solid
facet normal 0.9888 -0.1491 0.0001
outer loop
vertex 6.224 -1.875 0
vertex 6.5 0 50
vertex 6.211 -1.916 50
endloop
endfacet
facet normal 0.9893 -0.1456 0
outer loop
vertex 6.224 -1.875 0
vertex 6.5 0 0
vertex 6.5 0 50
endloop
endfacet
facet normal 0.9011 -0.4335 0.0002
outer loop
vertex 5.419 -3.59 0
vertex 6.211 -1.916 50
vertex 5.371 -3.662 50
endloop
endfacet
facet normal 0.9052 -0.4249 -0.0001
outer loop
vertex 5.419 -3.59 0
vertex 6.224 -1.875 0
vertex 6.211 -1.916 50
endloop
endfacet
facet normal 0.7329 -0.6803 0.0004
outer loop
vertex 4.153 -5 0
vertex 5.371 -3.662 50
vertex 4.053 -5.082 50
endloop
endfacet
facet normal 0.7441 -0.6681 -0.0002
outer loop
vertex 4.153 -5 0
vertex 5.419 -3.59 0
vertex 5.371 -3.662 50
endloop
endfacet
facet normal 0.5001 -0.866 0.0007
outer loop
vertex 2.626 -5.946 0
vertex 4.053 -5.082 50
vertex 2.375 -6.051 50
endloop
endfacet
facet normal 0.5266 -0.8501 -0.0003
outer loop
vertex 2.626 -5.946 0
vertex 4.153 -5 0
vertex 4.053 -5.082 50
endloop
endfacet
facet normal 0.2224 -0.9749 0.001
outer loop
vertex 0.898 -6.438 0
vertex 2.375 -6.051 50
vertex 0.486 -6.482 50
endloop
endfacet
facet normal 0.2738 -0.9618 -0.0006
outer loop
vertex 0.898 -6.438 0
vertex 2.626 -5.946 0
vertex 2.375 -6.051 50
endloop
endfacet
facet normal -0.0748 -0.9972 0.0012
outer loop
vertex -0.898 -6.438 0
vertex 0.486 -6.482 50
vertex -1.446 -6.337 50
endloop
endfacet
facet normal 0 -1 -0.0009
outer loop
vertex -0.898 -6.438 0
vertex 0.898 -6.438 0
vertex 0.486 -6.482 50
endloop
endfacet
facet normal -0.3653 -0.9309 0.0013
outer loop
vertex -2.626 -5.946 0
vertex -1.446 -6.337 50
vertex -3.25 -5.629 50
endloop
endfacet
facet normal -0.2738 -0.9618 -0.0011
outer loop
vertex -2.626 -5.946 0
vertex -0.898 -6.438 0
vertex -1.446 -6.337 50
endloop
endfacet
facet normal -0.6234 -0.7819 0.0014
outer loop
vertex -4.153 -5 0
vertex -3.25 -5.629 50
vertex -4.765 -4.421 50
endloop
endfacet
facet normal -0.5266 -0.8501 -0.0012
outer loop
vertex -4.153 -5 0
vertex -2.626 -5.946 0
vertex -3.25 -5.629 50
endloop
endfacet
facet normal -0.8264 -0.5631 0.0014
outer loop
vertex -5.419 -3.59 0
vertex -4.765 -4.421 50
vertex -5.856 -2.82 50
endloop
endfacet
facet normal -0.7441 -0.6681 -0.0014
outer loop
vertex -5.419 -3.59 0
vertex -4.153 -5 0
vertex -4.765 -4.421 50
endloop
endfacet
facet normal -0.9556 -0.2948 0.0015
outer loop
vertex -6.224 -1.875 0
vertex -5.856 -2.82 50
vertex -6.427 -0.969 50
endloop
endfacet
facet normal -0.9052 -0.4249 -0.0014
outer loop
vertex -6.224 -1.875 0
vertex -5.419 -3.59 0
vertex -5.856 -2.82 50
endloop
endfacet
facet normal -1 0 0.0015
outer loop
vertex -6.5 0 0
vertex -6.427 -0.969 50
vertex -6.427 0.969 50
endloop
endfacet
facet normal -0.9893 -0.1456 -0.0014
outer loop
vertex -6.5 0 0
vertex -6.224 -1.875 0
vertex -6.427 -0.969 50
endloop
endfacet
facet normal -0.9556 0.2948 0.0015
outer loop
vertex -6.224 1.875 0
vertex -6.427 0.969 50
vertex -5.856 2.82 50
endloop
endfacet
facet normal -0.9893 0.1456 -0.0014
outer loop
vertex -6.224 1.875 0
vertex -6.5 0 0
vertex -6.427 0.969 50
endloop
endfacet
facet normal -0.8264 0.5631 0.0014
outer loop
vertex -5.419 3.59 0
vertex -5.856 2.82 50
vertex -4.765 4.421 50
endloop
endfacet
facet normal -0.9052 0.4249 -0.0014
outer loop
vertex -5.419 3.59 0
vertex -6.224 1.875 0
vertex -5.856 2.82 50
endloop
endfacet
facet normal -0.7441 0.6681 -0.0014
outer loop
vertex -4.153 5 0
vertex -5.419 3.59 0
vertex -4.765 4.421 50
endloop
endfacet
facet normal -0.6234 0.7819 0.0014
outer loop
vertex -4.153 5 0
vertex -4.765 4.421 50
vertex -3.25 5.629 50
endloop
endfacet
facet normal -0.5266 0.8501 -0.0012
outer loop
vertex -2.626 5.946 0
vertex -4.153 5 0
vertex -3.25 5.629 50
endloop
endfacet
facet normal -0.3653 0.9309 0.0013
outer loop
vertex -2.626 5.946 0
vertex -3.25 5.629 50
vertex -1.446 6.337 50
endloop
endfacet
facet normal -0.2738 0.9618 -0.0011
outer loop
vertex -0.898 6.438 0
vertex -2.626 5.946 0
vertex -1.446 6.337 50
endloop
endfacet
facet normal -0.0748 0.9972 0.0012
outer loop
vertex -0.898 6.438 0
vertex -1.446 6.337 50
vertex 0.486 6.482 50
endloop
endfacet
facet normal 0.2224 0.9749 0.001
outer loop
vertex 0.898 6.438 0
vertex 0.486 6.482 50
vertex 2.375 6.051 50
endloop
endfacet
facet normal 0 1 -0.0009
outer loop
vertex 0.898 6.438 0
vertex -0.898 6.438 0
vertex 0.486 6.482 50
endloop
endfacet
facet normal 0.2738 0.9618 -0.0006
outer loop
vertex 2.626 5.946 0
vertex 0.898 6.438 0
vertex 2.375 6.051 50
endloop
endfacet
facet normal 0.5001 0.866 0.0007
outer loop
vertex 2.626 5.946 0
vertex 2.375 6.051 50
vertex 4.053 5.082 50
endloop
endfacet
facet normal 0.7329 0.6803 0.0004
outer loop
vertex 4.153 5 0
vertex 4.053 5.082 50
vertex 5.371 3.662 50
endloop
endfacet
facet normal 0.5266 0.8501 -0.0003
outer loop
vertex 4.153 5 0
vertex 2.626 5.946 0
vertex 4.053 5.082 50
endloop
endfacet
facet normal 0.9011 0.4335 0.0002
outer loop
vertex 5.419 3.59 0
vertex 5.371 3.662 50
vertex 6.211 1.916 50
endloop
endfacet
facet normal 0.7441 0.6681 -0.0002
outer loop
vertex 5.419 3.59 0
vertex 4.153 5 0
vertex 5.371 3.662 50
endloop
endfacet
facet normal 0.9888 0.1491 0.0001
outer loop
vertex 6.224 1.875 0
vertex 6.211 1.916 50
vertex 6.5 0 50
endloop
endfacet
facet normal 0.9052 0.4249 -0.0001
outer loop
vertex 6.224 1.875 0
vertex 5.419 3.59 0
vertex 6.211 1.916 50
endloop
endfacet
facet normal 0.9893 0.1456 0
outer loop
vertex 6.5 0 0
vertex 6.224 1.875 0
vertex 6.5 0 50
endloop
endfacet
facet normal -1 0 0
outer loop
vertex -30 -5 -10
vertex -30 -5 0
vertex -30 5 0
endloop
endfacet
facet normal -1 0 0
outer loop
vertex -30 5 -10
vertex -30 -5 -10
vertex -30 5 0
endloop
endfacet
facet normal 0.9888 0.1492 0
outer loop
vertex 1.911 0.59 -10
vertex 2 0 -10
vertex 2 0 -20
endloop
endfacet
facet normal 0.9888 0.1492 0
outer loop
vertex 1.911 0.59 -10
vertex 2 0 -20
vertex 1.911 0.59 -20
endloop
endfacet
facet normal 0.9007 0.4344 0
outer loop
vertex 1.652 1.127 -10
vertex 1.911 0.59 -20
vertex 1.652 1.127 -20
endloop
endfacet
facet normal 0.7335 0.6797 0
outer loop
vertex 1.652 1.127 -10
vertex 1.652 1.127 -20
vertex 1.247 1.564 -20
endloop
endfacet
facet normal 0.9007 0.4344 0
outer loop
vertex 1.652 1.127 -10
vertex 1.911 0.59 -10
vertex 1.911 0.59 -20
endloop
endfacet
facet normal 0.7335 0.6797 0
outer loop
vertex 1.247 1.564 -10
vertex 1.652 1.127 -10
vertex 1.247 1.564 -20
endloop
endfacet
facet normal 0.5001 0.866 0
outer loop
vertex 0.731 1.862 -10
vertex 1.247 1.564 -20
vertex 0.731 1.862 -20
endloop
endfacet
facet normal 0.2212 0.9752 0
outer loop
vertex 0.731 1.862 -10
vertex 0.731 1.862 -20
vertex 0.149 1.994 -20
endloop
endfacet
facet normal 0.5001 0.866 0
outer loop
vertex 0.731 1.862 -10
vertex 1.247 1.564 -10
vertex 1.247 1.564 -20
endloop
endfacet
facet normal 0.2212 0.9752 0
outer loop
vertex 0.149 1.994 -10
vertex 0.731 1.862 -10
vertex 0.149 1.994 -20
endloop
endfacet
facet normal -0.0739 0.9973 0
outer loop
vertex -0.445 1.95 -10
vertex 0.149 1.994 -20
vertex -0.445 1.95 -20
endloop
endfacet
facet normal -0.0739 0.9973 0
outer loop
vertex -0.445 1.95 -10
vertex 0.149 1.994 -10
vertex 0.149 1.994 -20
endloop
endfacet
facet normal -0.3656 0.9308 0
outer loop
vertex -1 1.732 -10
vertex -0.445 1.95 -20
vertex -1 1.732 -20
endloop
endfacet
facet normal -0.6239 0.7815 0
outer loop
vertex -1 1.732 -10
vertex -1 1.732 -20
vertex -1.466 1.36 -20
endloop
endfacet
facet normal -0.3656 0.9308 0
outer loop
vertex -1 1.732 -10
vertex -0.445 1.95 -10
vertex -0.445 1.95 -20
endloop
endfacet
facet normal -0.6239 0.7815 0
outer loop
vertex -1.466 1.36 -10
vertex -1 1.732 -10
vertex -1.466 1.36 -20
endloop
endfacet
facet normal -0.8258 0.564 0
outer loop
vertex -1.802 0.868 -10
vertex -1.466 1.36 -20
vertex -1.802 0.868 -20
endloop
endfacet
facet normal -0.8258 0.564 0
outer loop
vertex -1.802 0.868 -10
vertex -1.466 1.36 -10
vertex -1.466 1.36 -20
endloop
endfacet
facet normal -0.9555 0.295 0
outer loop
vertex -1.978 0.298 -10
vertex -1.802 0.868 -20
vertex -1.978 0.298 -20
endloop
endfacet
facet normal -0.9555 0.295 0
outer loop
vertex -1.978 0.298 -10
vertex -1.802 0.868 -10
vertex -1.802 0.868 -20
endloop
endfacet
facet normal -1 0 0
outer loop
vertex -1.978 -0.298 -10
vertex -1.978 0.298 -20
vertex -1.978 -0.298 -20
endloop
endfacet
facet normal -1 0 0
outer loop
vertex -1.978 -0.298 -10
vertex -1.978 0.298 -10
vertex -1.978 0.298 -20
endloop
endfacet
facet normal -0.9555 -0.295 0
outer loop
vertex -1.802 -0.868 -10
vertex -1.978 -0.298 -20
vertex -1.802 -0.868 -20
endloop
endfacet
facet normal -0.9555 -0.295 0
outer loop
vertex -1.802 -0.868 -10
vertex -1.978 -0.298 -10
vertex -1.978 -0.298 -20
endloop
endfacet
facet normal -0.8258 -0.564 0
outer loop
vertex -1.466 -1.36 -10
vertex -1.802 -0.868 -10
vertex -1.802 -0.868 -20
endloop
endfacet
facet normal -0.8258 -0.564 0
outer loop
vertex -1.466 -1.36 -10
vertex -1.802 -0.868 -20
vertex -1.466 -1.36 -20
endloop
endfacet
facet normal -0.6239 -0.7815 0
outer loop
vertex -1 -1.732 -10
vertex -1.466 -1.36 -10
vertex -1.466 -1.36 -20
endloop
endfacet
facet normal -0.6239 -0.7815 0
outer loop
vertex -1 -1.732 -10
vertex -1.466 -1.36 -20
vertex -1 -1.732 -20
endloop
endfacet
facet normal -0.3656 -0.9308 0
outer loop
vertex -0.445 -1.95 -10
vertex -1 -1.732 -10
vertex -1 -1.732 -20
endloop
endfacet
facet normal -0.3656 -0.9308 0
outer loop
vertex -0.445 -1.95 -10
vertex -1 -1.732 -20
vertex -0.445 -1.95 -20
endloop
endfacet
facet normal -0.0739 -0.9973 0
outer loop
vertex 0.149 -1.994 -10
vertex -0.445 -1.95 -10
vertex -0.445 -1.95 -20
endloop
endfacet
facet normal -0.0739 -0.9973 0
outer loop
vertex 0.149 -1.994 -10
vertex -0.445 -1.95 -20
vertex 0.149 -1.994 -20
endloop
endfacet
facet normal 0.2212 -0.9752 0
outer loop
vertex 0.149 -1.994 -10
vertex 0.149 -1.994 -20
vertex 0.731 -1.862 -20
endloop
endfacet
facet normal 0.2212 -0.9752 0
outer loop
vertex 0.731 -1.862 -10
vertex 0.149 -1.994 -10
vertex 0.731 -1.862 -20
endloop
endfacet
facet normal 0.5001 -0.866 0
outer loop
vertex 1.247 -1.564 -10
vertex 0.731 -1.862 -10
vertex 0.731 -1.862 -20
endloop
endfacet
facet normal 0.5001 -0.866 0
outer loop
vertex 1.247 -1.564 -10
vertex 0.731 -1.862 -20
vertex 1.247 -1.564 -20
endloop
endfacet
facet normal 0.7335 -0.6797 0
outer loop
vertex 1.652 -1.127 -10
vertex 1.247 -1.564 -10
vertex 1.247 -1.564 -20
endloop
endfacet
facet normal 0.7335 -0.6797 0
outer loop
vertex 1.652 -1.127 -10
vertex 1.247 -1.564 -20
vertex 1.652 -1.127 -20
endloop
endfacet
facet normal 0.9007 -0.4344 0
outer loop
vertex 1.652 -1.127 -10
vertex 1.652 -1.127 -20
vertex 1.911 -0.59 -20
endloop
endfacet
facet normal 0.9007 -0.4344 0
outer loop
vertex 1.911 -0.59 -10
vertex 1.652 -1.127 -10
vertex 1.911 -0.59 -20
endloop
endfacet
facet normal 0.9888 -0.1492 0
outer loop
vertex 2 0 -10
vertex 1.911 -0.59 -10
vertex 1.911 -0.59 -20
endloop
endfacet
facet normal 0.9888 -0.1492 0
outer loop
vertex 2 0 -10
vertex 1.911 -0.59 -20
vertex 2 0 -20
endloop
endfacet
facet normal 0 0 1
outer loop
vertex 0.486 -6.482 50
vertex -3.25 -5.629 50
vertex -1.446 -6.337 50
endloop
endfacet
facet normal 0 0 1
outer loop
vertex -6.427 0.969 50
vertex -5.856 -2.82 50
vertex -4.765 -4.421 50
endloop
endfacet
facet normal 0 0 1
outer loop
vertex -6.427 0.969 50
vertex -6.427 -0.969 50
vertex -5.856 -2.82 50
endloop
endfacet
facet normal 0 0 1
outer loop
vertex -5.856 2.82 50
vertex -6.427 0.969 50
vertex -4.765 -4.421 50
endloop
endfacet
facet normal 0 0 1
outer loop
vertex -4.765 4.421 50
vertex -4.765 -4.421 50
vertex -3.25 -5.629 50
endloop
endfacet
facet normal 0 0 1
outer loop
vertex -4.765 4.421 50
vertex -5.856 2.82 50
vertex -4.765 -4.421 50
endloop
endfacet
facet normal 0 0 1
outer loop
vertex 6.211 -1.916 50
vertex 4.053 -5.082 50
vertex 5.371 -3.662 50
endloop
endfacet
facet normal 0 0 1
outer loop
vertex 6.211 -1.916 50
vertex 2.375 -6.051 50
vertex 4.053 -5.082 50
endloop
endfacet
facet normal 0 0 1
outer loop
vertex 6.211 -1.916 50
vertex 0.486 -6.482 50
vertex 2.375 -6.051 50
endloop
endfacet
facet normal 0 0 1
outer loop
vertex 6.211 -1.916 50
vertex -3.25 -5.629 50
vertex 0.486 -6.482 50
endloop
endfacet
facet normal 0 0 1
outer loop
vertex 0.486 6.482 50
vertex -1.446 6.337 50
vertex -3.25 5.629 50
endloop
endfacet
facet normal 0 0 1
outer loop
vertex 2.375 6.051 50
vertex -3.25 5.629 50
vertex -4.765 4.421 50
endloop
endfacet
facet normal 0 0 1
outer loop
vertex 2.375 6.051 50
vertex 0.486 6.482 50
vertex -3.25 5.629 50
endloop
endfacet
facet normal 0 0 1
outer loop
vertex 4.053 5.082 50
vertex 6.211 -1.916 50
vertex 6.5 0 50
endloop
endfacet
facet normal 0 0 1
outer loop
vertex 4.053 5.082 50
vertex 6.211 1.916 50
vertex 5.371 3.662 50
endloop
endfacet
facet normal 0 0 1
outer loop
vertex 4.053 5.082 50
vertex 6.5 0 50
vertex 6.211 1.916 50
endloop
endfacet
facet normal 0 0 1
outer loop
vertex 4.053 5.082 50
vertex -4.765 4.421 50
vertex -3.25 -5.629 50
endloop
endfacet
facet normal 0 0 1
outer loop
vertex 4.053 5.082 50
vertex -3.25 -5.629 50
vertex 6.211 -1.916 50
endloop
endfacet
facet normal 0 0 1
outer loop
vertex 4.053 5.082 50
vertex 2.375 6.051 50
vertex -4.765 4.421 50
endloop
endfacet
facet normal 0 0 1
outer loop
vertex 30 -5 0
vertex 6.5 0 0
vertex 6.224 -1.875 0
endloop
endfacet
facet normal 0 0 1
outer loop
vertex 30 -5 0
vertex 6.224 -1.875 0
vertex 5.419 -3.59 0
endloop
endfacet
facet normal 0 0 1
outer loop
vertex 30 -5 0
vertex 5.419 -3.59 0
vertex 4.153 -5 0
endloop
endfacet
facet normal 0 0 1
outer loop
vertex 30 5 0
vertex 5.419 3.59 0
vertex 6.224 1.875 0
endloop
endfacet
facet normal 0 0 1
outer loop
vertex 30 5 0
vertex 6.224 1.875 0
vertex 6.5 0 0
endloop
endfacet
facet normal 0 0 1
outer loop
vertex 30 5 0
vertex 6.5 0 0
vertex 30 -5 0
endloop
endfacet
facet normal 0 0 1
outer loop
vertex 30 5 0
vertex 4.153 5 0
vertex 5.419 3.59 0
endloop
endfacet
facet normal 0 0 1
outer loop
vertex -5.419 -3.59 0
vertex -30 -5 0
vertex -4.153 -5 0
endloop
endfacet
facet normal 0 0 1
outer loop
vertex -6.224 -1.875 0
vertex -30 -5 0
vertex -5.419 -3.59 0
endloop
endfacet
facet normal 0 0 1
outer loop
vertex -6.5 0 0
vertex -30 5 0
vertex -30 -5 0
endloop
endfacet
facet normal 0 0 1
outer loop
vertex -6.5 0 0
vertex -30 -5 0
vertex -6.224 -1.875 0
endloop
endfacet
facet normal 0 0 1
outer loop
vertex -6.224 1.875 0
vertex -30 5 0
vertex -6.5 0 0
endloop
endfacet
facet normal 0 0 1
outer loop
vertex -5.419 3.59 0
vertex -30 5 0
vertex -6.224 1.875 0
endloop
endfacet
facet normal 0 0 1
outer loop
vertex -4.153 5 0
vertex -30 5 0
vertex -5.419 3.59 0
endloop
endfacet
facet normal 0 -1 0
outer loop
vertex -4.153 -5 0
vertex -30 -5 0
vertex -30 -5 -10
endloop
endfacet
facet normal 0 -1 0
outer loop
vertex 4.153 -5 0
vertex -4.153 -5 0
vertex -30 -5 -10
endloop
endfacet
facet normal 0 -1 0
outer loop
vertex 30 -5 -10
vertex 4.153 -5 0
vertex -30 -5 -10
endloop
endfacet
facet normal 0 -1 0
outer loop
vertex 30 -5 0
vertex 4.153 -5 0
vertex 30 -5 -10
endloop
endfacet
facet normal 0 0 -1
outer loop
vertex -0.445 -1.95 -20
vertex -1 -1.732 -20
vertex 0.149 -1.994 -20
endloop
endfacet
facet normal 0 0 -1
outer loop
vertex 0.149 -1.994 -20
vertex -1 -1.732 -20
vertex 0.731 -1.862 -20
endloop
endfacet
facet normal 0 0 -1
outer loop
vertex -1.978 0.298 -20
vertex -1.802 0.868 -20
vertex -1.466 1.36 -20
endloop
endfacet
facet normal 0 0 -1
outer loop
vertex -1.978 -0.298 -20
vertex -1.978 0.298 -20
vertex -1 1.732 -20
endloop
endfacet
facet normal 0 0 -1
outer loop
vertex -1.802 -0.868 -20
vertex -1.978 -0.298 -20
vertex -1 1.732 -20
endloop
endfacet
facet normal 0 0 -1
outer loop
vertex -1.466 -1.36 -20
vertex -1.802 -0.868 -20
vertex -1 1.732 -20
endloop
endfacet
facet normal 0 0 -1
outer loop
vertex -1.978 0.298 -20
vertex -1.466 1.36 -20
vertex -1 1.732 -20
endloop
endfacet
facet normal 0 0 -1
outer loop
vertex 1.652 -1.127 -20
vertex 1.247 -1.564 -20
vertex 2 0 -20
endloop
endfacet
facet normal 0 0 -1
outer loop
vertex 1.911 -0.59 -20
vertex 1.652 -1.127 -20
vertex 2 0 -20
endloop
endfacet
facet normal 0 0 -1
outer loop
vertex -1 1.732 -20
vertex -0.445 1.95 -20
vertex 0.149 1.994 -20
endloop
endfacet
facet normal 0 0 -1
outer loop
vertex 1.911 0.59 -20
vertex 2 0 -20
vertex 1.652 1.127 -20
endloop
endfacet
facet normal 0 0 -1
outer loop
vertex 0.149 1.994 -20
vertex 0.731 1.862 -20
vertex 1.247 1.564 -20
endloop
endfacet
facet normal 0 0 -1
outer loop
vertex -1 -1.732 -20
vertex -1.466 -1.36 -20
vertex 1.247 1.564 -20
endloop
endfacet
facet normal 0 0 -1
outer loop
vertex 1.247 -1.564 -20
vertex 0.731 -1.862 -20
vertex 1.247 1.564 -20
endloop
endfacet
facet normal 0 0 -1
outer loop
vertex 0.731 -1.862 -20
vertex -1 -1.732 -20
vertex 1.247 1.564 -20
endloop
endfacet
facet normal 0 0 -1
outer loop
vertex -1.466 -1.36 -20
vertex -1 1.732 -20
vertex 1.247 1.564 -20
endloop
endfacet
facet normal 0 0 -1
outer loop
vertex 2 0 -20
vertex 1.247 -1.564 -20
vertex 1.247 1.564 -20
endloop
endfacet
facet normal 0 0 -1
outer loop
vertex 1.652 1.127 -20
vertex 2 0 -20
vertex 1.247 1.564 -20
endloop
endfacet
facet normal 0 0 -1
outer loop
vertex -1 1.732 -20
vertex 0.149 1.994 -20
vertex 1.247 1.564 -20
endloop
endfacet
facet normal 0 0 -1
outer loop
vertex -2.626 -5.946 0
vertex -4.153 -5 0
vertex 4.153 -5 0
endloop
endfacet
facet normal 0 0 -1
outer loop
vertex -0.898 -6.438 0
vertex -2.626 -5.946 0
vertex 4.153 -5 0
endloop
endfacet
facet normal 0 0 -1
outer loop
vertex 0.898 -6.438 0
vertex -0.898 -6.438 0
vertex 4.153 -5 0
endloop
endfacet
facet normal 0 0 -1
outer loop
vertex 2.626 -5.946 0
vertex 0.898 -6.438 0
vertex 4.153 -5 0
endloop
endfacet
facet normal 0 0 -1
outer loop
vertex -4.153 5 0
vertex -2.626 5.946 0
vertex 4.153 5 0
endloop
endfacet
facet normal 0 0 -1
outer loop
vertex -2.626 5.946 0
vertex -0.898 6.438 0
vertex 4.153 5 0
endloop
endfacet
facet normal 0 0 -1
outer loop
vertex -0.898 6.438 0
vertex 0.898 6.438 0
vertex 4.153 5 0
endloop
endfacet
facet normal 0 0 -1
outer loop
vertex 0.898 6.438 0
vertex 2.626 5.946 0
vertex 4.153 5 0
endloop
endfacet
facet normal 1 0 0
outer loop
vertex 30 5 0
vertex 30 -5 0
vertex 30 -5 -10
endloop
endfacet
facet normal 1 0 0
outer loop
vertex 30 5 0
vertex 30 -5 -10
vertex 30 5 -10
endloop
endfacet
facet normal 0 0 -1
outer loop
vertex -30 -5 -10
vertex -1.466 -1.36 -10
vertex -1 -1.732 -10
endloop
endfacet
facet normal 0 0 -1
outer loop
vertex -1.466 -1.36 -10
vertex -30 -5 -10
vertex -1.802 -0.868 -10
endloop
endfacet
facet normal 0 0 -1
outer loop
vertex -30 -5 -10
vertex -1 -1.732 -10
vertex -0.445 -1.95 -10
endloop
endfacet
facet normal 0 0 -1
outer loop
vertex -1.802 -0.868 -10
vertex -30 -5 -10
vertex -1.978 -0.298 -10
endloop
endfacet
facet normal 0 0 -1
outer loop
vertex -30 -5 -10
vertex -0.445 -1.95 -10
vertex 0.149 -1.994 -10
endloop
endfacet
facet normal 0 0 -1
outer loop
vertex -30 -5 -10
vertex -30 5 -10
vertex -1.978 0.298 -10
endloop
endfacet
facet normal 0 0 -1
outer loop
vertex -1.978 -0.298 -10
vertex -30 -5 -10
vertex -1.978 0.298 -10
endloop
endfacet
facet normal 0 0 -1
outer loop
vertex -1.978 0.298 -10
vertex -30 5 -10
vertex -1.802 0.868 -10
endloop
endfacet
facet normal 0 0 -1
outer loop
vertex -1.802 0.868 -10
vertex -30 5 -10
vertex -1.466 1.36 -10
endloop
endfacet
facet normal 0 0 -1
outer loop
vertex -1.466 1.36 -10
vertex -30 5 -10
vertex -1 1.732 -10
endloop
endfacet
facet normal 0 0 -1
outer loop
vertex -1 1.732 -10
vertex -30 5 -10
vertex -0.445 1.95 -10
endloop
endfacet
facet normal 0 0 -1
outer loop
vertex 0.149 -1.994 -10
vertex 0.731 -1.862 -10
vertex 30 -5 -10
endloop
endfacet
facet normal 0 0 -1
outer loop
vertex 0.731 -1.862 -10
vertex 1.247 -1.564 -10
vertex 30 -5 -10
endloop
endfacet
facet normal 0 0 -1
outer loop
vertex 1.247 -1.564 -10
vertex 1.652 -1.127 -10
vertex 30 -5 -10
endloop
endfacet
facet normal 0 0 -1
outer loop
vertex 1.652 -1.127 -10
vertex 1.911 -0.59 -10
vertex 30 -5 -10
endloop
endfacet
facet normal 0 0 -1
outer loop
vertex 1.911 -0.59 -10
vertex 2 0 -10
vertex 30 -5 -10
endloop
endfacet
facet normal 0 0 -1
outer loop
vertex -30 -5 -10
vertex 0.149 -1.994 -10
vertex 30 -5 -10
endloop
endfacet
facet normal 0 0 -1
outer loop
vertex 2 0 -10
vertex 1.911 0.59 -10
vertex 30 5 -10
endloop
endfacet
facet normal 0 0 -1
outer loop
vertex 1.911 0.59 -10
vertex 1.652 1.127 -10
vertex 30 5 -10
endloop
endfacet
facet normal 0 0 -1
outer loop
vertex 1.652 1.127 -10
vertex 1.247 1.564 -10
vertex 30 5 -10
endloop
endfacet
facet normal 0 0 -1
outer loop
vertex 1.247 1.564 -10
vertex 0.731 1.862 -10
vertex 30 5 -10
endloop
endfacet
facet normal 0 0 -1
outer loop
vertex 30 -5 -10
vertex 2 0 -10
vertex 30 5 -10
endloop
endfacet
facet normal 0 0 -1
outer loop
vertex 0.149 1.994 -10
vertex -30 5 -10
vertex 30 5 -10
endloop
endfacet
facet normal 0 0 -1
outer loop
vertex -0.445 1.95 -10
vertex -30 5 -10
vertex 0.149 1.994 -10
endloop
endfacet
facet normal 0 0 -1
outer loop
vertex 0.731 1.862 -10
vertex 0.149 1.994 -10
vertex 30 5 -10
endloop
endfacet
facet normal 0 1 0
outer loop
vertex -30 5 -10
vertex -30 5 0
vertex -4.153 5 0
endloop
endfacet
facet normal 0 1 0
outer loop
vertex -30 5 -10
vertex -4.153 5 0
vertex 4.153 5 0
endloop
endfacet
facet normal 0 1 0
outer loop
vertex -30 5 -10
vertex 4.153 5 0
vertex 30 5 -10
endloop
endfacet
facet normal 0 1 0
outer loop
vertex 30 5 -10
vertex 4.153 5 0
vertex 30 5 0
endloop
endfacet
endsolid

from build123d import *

# Parameters (mm, degrees)
F1_R     = 6.5
F3_W     = 60
F3_H     = 10
F4_DEPTH = 10
F5_R     = 2
F6_DEPTH = 20


with BuildPart() as f2:
    # F2: sweep along a path in F0
    with BuildLine(Plane.XZ) as f2_path:
        Line((0, 50), (0, 0))
    # F1 (on Top) → F2 (sweep)
    with BuildSketch(Plane.XY):
        Circle(F1_R)
    sweep(path=f2_path.line)

    # F3 (on Top) → F4 (join)
    with BuildSketch(Plane.XY):
        Rectangle(F3_W, F3_H)
    extrude(amount=-F4_DEPTH)

    # F5 (on Top) → F6 (join)
    with BuildSketch(Plane.XY):
        Circle(F5_R)
    extrude(amount=-F6_DEPTH)


solid = f2.part
